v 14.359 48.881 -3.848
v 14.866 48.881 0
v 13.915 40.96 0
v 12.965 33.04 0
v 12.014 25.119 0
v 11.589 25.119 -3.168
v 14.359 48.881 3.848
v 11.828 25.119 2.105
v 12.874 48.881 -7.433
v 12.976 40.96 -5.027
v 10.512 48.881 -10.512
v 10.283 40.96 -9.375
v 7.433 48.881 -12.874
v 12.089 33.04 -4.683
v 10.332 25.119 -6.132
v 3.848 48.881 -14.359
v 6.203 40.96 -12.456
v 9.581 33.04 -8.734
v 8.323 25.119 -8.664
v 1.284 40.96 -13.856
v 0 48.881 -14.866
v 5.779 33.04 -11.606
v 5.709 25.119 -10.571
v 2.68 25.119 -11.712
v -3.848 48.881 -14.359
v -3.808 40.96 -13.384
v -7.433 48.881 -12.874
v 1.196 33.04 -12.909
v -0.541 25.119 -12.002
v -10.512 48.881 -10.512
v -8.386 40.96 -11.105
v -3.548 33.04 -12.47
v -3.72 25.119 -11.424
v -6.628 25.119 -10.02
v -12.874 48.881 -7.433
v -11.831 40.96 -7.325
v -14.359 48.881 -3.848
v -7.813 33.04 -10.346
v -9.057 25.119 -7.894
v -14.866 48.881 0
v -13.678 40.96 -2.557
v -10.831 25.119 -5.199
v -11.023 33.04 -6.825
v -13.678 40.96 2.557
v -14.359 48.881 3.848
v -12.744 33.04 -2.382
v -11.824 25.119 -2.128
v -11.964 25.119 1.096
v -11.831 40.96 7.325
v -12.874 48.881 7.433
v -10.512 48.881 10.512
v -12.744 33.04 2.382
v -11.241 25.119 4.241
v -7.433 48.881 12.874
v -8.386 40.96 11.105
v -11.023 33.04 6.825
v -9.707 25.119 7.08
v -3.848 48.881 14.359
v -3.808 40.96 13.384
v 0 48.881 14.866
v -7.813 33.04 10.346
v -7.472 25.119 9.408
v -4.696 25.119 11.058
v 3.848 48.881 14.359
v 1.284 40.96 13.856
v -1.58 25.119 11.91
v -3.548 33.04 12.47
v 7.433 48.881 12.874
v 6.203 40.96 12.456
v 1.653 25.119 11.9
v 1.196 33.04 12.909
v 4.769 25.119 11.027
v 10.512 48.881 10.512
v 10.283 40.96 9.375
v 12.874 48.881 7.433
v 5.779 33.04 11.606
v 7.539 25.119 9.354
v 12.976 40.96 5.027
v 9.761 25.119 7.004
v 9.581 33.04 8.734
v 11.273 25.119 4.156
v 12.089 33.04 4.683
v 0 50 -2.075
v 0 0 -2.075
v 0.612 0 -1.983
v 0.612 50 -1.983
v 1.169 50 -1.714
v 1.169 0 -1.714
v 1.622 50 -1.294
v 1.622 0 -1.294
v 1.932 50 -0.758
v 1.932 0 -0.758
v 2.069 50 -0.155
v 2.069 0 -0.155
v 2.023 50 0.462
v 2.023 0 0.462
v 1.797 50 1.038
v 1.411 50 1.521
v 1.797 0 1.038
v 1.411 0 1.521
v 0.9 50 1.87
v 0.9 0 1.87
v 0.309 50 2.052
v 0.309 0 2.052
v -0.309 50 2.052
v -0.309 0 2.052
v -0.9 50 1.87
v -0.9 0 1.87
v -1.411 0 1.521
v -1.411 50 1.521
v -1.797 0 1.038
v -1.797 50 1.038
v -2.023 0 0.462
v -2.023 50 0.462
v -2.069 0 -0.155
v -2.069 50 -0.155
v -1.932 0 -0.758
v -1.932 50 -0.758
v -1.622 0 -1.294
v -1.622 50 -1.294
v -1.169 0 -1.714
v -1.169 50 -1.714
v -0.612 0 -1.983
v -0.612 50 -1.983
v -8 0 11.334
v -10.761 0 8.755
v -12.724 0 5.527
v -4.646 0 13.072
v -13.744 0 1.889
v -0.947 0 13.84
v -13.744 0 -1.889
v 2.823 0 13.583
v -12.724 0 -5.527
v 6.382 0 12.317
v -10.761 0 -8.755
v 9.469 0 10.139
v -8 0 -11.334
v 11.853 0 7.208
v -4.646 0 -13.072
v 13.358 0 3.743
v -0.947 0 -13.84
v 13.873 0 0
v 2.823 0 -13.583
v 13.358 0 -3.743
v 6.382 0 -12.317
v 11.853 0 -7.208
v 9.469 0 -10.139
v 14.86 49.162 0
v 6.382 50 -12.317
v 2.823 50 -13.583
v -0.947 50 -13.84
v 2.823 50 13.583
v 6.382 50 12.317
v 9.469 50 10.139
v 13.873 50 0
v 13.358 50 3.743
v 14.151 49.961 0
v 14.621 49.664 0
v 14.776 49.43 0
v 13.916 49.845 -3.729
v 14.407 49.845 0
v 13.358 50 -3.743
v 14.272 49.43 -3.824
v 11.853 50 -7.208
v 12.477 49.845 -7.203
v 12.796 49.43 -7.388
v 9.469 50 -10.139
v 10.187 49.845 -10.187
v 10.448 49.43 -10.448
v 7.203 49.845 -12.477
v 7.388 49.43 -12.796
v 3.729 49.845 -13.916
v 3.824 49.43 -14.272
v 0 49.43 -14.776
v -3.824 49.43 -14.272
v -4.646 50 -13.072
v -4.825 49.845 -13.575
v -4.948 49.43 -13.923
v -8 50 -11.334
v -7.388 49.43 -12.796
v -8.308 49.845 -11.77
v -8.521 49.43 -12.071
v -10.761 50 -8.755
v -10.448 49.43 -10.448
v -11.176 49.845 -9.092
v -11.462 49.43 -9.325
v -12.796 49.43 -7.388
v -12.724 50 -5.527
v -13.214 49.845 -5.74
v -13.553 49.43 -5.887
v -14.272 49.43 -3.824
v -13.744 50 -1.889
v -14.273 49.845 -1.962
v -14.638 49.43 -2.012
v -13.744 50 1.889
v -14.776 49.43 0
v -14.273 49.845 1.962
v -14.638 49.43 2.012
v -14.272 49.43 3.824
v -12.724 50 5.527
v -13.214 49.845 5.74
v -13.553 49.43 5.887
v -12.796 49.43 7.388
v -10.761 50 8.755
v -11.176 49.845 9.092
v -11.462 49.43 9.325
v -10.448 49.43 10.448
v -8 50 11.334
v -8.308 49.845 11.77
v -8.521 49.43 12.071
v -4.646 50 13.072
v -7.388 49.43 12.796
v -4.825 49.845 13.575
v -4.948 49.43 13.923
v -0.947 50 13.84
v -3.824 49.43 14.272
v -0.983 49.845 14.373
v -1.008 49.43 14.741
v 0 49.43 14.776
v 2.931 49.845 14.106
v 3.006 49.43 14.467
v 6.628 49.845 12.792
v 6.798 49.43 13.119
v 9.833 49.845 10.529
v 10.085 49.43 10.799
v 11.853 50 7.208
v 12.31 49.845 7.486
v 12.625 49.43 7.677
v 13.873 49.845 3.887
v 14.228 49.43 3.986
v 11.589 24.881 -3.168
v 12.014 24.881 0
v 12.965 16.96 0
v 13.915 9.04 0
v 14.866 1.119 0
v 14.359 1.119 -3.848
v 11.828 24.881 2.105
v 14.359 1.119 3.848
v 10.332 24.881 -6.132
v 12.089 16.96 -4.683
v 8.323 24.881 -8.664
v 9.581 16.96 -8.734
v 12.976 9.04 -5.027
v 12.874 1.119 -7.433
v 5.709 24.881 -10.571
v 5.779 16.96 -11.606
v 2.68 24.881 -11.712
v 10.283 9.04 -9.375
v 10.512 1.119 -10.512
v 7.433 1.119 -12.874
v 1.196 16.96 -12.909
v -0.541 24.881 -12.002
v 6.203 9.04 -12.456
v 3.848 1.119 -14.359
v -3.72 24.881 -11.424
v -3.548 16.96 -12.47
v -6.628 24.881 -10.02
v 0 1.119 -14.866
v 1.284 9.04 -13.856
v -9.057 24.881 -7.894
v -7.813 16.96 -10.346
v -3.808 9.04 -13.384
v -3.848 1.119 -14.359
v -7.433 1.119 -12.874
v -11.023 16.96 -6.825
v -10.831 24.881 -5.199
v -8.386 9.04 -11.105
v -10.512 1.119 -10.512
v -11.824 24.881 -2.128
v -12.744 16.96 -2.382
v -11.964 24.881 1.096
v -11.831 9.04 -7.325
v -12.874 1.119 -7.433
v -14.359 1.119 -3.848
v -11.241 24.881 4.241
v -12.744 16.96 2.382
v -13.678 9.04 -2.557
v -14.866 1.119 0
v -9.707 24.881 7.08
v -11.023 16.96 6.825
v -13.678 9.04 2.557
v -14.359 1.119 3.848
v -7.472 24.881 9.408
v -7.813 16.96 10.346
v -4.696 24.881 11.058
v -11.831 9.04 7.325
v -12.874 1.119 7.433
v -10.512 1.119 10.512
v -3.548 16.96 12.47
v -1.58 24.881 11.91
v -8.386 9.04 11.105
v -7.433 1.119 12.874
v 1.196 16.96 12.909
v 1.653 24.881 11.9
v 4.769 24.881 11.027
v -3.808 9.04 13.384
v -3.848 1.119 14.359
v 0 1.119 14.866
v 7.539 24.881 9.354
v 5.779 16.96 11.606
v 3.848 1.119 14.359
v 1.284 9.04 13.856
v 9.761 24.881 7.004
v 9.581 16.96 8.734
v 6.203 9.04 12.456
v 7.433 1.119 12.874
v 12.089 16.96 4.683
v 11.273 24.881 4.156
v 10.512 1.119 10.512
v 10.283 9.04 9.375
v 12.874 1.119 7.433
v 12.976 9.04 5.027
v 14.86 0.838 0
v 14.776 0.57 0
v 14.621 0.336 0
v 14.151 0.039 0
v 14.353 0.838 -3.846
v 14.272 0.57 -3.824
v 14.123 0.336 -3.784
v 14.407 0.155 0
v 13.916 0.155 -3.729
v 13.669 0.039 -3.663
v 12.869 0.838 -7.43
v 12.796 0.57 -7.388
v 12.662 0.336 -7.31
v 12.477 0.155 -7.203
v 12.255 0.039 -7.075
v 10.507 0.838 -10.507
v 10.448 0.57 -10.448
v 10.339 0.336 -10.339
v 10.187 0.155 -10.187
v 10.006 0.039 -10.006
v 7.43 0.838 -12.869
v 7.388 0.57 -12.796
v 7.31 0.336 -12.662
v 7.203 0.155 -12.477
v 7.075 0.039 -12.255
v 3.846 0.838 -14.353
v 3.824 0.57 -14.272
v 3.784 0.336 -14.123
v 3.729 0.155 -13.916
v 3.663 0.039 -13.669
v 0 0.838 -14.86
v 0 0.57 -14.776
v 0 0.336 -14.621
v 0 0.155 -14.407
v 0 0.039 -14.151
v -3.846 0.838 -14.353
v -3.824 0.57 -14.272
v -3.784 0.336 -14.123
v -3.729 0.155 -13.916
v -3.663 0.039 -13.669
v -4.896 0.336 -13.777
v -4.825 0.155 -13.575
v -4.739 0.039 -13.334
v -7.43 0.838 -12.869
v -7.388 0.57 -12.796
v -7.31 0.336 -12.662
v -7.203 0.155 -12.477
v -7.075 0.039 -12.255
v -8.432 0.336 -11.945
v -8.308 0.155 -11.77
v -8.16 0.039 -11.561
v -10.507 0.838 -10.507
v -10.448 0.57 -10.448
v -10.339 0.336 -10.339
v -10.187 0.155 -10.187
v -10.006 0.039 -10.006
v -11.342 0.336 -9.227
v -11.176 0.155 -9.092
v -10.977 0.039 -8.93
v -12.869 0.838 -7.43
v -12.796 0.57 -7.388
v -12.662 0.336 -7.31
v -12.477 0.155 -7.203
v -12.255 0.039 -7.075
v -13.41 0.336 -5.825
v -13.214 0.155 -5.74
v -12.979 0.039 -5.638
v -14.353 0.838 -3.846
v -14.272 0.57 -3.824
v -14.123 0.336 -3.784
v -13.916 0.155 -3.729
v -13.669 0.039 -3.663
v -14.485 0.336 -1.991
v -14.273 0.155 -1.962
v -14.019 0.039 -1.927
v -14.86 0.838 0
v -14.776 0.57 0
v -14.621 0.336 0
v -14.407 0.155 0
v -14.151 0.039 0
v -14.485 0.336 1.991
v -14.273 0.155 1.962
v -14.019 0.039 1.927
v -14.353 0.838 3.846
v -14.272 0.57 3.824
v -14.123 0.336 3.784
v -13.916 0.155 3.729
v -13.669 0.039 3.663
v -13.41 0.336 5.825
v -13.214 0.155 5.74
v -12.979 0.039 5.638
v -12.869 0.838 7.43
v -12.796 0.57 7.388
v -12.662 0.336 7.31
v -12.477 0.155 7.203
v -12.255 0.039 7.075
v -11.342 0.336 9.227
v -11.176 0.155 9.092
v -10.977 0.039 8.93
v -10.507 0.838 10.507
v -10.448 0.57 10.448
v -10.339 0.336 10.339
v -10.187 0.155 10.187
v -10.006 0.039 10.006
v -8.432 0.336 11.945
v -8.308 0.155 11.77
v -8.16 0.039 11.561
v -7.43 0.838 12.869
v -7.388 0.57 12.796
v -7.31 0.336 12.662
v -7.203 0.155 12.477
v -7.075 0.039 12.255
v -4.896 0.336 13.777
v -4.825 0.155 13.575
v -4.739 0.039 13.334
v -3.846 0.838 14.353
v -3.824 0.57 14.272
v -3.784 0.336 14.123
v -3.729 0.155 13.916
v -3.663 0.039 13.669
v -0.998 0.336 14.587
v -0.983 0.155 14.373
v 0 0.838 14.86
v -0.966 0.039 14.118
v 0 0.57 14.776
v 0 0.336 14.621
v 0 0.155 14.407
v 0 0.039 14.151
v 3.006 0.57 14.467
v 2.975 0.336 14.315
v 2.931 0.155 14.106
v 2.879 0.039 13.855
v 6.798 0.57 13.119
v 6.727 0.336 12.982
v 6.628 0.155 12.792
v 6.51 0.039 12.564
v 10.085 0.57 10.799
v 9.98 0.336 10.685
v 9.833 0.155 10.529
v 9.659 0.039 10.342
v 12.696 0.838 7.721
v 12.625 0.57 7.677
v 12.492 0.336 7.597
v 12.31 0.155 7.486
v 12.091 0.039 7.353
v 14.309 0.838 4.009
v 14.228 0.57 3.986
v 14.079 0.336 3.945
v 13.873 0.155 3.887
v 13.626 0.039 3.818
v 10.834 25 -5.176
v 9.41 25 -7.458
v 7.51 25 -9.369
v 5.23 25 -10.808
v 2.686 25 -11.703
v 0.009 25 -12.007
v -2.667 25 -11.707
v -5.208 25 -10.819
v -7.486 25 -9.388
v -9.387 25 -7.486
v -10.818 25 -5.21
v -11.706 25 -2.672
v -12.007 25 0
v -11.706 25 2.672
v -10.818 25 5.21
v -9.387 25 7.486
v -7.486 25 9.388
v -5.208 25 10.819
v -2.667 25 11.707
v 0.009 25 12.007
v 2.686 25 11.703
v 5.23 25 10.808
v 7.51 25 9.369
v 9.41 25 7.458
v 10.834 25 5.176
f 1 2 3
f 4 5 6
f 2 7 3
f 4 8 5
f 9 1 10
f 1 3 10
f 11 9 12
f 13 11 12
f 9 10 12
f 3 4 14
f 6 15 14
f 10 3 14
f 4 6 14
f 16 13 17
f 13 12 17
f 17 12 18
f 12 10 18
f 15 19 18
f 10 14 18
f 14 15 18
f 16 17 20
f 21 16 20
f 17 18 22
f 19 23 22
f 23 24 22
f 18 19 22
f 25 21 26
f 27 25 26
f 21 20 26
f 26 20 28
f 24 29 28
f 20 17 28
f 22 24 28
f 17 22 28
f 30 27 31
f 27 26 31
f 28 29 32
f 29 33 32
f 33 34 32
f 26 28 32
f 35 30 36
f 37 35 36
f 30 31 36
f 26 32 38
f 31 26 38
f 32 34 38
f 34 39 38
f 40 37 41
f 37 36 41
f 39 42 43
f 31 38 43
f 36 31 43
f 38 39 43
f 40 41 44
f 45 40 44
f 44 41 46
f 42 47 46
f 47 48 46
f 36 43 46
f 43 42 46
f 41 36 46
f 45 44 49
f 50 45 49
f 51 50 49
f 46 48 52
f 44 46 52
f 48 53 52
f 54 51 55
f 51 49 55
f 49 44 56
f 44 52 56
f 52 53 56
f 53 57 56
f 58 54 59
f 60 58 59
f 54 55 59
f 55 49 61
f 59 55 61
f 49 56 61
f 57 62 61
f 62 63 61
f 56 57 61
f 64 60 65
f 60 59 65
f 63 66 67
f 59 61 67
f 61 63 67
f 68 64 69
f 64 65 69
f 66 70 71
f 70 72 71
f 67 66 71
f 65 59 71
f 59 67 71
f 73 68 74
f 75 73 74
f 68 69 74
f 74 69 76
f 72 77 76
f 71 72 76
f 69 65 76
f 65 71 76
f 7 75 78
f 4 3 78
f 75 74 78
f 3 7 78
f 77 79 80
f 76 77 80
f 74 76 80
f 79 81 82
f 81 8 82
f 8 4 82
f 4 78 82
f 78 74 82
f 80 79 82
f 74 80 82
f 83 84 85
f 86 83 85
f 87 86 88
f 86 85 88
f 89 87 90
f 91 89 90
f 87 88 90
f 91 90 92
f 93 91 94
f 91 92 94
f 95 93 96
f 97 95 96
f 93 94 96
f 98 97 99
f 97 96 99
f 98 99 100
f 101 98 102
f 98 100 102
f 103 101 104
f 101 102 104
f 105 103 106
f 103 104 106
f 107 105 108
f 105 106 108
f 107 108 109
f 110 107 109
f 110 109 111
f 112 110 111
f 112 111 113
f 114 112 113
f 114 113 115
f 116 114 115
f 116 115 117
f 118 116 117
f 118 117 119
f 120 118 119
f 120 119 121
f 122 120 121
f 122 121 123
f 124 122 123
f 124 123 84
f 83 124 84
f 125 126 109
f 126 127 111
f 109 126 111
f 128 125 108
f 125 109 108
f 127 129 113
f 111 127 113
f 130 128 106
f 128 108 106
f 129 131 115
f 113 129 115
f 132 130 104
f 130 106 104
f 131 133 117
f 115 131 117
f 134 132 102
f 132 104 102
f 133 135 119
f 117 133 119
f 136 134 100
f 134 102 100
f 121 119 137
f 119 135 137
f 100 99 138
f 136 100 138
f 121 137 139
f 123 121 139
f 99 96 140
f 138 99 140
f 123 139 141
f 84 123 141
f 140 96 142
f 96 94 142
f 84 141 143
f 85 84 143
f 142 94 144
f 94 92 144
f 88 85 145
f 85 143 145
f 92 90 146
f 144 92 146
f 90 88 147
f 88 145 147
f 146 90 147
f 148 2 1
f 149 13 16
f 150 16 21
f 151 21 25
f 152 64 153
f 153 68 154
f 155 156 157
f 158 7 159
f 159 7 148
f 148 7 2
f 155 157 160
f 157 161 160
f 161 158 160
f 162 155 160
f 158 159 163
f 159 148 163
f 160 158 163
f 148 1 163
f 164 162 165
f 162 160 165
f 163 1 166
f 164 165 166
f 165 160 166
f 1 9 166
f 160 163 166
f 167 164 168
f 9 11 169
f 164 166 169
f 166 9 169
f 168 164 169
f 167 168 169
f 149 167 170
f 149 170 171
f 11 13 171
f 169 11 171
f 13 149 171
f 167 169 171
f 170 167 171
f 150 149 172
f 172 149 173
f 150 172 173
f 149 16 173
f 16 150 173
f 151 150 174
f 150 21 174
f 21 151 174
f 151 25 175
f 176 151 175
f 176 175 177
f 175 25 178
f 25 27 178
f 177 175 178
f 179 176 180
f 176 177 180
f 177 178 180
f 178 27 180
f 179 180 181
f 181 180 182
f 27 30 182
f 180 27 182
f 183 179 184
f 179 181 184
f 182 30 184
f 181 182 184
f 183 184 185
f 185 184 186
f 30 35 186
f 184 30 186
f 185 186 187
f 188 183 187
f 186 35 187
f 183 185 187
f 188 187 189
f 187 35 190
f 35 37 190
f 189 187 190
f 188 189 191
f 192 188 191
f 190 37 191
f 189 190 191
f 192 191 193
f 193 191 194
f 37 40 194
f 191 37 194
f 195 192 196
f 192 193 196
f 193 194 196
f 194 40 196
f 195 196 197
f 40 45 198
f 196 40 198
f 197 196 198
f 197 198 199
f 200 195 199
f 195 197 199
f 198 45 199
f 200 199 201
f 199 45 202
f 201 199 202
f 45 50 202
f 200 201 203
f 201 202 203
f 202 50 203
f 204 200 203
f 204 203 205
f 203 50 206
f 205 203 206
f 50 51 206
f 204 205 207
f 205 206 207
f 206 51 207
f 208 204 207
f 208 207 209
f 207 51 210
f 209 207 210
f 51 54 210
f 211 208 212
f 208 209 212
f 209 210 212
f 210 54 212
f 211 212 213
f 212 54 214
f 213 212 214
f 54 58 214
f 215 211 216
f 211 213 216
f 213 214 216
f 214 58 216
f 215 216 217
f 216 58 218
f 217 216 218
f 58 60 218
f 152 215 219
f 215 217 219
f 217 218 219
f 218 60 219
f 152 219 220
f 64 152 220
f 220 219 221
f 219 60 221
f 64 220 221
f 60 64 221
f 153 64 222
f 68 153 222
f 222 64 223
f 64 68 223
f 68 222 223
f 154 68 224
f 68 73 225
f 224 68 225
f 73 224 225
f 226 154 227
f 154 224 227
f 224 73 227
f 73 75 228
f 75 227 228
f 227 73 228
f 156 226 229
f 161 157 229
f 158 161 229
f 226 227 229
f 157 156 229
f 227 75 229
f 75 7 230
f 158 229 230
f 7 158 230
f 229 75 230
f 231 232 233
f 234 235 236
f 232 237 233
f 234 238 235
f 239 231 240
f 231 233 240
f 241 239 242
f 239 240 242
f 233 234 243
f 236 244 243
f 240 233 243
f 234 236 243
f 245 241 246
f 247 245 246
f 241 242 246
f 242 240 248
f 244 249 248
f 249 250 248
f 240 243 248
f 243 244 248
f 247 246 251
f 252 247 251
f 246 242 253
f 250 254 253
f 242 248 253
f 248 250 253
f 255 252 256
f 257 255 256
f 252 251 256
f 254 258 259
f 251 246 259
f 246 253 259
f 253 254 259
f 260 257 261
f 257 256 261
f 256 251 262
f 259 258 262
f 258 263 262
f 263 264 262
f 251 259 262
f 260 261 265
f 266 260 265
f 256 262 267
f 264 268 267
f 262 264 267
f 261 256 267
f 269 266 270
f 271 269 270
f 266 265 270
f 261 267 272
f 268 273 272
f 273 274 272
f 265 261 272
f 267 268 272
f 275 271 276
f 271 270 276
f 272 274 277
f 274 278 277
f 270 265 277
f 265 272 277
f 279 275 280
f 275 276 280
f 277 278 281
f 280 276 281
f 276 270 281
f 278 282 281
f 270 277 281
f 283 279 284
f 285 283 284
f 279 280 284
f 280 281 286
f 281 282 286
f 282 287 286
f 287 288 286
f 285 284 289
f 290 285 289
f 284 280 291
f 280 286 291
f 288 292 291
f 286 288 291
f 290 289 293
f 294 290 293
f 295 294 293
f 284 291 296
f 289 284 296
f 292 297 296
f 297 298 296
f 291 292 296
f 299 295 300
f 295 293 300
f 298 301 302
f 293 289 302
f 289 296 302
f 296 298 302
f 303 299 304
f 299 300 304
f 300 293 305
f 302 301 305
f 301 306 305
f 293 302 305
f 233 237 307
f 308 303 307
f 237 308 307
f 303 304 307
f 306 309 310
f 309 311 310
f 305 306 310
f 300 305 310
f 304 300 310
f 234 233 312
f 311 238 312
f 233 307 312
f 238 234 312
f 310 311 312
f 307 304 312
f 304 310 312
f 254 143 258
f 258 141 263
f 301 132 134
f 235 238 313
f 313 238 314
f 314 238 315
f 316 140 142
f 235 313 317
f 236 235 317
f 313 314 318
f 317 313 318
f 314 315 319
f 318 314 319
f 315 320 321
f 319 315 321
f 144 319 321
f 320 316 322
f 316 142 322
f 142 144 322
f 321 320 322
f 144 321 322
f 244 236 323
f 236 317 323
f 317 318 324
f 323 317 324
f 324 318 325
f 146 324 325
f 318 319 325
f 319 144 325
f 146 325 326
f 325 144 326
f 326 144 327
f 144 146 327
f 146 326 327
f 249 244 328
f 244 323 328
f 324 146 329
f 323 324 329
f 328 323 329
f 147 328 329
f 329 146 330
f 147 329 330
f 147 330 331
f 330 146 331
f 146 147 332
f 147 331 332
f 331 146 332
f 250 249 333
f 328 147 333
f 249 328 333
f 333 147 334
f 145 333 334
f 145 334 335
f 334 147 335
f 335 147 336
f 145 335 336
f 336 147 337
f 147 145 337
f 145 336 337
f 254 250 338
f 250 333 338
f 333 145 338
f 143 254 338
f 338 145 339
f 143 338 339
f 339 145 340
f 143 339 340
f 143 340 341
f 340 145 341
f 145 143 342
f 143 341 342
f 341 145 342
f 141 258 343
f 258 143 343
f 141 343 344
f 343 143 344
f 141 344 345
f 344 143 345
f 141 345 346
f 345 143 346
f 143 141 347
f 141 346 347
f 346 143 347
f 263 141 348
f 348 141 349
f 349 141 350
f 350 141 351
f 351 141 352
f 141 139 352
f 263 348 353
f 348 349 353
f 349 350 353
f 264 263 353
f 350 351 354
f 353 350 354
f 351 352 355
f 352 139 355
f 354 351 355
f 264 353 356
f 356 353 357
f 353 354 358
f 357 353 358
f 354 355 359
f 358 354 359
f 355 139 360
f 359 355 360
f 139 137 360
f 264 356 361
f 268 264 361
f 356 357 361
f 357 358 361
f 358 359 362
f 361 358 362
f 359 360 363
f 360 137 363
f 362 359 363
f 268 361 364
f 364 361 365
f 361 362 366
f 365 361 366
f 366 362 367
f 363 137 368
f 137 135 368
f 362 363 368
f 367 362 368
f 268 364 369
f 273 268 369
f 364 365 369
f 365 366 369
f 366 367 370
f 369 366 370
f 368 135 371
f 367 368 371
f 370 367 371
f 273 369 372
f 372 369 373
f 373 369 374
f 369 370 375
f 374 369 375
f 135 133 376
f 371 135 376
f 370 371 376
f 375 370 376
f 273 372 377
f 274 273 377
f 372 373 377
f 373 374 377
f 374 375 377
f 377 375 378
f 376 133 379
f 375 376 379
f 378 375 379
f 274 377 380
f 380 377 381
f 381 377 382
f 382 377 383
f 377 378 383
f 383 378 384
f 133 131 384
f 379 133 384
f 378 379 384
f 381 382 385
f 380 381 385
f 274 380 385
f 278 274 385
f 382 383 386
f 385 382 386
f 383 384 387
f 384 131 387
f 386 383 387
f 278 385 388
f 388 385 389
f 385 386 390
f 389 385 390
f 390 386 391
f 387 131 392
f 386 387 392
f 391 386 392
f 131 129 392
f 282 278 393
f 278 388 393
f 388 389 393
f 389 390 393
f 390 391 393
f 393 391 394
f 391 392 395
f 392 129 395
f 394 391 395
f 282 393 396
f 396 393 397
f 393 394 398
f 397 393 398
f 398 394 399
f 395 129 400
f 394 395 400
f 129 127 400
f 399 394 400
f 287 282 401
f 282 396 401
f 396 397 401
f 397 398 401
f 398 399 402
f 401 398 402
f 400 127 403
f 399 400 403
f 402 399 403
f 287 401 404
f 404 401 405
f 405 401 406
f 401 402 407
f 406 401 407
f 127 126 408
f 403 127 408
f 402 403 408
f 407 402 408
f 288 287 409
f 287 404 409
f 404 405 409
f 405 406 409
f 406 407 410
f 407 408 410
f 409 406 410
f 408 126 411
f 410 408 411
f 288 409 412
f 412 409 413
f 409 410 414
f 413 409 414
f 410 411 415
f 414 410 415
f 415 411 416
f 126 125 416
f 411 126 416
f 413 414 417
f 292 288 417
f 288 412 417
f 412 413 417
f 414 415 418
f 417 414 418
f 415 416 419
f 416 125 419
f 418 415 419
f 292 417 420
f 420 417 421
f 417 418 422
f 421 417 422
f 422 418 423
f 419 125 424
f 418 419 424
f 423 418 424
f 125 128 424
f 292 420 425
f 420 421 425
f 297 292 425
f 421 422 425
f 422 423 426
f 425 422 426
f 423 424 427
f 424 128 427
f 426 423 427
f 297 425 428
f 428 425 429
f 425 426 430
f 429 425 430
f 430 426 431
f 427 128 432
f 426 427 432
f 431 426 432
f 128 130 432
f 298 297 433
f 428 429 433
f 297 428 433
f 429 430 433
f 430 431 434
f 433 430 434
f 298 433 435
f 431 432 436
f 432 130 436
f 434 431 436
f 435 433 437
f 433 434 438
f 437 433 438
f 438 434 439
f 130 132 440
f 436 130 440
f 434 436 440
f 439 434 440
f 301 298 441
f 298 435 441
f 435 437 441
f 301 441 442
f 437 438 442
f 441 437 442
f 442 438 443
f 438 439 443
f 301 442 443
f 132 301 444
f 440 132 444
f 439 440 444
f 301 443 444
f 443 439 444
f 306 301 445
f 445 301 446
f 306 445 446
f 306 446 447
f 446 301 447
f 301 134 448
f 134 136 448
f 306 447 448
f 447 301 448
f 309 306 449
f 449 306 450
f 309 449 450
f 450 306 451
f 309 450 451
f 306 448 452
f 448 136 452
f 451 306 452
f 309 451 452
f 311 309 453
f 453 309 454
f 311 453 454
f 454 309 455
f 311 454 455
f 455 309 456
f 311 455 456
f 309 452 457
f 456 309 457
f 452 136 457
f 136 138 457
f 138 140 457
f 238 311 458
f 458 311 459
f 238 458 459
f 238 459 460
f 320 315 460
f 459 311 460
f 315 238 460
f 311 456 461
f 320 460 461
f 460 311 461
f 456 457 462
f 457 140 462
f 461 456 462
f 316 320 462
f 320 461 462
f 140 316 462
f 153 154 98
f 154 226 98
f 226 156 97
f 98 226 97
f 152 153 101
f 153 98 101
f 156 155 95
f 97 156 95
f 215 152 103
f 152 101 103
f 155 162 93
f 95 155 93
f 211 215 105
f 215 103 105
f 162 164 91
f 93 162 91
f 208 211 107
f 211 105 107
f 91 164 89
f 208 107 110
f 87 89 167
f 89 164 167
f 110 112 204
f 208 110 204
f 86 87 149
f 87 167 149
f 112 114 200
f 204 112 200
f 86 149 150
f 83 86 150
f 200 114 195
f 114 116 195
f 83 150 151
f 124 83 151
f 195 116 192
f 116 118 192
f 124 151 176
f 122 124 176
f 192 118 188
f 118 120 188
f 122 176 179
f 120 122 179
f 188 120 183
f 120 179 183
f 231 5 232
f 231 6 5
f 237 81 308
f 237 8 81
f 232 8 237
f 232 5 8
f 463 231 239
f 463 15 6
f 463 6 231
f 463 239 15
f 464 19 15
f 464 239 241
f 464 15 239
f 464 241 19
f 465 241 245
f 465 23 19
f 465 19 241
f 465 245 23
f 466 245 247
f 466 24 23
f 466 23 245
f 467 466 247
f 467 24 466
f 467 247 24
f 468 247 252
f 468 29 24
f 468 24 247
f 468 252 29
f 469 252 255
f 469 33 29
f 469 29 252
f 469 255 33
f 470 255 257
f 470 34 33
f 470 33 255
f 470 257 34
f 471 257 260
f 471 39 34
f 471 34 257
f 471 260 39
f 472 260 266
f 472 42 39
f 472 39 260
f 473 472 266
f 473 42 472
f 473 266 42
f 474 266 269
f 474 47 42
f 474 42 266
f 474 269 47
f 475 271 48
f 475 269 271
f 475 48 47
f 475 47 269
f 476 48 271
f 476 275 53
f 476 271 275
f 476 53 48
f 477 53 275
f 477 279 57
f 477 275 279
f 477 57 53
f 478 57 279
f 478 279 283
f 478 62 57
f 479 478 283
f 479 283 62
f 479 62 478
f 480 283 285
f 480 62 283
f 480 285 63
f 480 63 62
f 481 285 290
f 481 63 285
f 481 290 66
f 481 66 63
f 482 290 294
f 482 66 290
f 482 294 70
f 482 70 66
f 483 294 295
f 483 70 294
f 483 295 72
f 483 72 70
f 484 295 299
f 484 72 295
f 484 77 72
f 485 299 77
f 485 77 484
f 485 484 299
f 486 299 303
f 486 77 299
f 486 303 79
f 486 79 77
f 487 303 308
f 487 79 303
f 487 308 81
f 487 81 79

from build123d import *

# Parameters (mm, degrees)
SKETCH_3_R          = 2.075
CUT_EXTRUDE_1_DEPTH = 60
FILLET_1_R          = 1


with BuildPart() as part:
    # 草图2 → 旋转1 (revolve)
    with BuildSketch(Plane.XY, mode=Mode.PRIVATE) as revolve_1_sk:
        Polygon((0, 0), (0, 50), (-15, 50), (-12, 25), (-15, 0), align=None)
    revolve(revolve_1_sk.sketch.rotate(Axis((0, 0, 0), (0, 1, 0)), 180), axis=Axis((0, 0, 0), (0, 1, 0)))

    # 草图3 → 切除-拉伸1 (cut)
    with BuildSketch(Plane.XZ):
        with Locations(Location((0, 0, 0), (0, 0, 270))):
            Circle(SKETCH_3_R)
    extrude(amount=-CUT_EXTRUDE_1_DEPTH, mode=Mode.SUBTRACT)

    # 圆角1
    fillet_1_edges = [part.edges().sort_by_distance(p)[0] for p in [
        (-15, 50, 0),
        (-15, 0, 0),
        (-12, 25, 0),
    ]]
    fillet(fillet_1_edges, radius=FILLET_1_R)


solid = part.part
